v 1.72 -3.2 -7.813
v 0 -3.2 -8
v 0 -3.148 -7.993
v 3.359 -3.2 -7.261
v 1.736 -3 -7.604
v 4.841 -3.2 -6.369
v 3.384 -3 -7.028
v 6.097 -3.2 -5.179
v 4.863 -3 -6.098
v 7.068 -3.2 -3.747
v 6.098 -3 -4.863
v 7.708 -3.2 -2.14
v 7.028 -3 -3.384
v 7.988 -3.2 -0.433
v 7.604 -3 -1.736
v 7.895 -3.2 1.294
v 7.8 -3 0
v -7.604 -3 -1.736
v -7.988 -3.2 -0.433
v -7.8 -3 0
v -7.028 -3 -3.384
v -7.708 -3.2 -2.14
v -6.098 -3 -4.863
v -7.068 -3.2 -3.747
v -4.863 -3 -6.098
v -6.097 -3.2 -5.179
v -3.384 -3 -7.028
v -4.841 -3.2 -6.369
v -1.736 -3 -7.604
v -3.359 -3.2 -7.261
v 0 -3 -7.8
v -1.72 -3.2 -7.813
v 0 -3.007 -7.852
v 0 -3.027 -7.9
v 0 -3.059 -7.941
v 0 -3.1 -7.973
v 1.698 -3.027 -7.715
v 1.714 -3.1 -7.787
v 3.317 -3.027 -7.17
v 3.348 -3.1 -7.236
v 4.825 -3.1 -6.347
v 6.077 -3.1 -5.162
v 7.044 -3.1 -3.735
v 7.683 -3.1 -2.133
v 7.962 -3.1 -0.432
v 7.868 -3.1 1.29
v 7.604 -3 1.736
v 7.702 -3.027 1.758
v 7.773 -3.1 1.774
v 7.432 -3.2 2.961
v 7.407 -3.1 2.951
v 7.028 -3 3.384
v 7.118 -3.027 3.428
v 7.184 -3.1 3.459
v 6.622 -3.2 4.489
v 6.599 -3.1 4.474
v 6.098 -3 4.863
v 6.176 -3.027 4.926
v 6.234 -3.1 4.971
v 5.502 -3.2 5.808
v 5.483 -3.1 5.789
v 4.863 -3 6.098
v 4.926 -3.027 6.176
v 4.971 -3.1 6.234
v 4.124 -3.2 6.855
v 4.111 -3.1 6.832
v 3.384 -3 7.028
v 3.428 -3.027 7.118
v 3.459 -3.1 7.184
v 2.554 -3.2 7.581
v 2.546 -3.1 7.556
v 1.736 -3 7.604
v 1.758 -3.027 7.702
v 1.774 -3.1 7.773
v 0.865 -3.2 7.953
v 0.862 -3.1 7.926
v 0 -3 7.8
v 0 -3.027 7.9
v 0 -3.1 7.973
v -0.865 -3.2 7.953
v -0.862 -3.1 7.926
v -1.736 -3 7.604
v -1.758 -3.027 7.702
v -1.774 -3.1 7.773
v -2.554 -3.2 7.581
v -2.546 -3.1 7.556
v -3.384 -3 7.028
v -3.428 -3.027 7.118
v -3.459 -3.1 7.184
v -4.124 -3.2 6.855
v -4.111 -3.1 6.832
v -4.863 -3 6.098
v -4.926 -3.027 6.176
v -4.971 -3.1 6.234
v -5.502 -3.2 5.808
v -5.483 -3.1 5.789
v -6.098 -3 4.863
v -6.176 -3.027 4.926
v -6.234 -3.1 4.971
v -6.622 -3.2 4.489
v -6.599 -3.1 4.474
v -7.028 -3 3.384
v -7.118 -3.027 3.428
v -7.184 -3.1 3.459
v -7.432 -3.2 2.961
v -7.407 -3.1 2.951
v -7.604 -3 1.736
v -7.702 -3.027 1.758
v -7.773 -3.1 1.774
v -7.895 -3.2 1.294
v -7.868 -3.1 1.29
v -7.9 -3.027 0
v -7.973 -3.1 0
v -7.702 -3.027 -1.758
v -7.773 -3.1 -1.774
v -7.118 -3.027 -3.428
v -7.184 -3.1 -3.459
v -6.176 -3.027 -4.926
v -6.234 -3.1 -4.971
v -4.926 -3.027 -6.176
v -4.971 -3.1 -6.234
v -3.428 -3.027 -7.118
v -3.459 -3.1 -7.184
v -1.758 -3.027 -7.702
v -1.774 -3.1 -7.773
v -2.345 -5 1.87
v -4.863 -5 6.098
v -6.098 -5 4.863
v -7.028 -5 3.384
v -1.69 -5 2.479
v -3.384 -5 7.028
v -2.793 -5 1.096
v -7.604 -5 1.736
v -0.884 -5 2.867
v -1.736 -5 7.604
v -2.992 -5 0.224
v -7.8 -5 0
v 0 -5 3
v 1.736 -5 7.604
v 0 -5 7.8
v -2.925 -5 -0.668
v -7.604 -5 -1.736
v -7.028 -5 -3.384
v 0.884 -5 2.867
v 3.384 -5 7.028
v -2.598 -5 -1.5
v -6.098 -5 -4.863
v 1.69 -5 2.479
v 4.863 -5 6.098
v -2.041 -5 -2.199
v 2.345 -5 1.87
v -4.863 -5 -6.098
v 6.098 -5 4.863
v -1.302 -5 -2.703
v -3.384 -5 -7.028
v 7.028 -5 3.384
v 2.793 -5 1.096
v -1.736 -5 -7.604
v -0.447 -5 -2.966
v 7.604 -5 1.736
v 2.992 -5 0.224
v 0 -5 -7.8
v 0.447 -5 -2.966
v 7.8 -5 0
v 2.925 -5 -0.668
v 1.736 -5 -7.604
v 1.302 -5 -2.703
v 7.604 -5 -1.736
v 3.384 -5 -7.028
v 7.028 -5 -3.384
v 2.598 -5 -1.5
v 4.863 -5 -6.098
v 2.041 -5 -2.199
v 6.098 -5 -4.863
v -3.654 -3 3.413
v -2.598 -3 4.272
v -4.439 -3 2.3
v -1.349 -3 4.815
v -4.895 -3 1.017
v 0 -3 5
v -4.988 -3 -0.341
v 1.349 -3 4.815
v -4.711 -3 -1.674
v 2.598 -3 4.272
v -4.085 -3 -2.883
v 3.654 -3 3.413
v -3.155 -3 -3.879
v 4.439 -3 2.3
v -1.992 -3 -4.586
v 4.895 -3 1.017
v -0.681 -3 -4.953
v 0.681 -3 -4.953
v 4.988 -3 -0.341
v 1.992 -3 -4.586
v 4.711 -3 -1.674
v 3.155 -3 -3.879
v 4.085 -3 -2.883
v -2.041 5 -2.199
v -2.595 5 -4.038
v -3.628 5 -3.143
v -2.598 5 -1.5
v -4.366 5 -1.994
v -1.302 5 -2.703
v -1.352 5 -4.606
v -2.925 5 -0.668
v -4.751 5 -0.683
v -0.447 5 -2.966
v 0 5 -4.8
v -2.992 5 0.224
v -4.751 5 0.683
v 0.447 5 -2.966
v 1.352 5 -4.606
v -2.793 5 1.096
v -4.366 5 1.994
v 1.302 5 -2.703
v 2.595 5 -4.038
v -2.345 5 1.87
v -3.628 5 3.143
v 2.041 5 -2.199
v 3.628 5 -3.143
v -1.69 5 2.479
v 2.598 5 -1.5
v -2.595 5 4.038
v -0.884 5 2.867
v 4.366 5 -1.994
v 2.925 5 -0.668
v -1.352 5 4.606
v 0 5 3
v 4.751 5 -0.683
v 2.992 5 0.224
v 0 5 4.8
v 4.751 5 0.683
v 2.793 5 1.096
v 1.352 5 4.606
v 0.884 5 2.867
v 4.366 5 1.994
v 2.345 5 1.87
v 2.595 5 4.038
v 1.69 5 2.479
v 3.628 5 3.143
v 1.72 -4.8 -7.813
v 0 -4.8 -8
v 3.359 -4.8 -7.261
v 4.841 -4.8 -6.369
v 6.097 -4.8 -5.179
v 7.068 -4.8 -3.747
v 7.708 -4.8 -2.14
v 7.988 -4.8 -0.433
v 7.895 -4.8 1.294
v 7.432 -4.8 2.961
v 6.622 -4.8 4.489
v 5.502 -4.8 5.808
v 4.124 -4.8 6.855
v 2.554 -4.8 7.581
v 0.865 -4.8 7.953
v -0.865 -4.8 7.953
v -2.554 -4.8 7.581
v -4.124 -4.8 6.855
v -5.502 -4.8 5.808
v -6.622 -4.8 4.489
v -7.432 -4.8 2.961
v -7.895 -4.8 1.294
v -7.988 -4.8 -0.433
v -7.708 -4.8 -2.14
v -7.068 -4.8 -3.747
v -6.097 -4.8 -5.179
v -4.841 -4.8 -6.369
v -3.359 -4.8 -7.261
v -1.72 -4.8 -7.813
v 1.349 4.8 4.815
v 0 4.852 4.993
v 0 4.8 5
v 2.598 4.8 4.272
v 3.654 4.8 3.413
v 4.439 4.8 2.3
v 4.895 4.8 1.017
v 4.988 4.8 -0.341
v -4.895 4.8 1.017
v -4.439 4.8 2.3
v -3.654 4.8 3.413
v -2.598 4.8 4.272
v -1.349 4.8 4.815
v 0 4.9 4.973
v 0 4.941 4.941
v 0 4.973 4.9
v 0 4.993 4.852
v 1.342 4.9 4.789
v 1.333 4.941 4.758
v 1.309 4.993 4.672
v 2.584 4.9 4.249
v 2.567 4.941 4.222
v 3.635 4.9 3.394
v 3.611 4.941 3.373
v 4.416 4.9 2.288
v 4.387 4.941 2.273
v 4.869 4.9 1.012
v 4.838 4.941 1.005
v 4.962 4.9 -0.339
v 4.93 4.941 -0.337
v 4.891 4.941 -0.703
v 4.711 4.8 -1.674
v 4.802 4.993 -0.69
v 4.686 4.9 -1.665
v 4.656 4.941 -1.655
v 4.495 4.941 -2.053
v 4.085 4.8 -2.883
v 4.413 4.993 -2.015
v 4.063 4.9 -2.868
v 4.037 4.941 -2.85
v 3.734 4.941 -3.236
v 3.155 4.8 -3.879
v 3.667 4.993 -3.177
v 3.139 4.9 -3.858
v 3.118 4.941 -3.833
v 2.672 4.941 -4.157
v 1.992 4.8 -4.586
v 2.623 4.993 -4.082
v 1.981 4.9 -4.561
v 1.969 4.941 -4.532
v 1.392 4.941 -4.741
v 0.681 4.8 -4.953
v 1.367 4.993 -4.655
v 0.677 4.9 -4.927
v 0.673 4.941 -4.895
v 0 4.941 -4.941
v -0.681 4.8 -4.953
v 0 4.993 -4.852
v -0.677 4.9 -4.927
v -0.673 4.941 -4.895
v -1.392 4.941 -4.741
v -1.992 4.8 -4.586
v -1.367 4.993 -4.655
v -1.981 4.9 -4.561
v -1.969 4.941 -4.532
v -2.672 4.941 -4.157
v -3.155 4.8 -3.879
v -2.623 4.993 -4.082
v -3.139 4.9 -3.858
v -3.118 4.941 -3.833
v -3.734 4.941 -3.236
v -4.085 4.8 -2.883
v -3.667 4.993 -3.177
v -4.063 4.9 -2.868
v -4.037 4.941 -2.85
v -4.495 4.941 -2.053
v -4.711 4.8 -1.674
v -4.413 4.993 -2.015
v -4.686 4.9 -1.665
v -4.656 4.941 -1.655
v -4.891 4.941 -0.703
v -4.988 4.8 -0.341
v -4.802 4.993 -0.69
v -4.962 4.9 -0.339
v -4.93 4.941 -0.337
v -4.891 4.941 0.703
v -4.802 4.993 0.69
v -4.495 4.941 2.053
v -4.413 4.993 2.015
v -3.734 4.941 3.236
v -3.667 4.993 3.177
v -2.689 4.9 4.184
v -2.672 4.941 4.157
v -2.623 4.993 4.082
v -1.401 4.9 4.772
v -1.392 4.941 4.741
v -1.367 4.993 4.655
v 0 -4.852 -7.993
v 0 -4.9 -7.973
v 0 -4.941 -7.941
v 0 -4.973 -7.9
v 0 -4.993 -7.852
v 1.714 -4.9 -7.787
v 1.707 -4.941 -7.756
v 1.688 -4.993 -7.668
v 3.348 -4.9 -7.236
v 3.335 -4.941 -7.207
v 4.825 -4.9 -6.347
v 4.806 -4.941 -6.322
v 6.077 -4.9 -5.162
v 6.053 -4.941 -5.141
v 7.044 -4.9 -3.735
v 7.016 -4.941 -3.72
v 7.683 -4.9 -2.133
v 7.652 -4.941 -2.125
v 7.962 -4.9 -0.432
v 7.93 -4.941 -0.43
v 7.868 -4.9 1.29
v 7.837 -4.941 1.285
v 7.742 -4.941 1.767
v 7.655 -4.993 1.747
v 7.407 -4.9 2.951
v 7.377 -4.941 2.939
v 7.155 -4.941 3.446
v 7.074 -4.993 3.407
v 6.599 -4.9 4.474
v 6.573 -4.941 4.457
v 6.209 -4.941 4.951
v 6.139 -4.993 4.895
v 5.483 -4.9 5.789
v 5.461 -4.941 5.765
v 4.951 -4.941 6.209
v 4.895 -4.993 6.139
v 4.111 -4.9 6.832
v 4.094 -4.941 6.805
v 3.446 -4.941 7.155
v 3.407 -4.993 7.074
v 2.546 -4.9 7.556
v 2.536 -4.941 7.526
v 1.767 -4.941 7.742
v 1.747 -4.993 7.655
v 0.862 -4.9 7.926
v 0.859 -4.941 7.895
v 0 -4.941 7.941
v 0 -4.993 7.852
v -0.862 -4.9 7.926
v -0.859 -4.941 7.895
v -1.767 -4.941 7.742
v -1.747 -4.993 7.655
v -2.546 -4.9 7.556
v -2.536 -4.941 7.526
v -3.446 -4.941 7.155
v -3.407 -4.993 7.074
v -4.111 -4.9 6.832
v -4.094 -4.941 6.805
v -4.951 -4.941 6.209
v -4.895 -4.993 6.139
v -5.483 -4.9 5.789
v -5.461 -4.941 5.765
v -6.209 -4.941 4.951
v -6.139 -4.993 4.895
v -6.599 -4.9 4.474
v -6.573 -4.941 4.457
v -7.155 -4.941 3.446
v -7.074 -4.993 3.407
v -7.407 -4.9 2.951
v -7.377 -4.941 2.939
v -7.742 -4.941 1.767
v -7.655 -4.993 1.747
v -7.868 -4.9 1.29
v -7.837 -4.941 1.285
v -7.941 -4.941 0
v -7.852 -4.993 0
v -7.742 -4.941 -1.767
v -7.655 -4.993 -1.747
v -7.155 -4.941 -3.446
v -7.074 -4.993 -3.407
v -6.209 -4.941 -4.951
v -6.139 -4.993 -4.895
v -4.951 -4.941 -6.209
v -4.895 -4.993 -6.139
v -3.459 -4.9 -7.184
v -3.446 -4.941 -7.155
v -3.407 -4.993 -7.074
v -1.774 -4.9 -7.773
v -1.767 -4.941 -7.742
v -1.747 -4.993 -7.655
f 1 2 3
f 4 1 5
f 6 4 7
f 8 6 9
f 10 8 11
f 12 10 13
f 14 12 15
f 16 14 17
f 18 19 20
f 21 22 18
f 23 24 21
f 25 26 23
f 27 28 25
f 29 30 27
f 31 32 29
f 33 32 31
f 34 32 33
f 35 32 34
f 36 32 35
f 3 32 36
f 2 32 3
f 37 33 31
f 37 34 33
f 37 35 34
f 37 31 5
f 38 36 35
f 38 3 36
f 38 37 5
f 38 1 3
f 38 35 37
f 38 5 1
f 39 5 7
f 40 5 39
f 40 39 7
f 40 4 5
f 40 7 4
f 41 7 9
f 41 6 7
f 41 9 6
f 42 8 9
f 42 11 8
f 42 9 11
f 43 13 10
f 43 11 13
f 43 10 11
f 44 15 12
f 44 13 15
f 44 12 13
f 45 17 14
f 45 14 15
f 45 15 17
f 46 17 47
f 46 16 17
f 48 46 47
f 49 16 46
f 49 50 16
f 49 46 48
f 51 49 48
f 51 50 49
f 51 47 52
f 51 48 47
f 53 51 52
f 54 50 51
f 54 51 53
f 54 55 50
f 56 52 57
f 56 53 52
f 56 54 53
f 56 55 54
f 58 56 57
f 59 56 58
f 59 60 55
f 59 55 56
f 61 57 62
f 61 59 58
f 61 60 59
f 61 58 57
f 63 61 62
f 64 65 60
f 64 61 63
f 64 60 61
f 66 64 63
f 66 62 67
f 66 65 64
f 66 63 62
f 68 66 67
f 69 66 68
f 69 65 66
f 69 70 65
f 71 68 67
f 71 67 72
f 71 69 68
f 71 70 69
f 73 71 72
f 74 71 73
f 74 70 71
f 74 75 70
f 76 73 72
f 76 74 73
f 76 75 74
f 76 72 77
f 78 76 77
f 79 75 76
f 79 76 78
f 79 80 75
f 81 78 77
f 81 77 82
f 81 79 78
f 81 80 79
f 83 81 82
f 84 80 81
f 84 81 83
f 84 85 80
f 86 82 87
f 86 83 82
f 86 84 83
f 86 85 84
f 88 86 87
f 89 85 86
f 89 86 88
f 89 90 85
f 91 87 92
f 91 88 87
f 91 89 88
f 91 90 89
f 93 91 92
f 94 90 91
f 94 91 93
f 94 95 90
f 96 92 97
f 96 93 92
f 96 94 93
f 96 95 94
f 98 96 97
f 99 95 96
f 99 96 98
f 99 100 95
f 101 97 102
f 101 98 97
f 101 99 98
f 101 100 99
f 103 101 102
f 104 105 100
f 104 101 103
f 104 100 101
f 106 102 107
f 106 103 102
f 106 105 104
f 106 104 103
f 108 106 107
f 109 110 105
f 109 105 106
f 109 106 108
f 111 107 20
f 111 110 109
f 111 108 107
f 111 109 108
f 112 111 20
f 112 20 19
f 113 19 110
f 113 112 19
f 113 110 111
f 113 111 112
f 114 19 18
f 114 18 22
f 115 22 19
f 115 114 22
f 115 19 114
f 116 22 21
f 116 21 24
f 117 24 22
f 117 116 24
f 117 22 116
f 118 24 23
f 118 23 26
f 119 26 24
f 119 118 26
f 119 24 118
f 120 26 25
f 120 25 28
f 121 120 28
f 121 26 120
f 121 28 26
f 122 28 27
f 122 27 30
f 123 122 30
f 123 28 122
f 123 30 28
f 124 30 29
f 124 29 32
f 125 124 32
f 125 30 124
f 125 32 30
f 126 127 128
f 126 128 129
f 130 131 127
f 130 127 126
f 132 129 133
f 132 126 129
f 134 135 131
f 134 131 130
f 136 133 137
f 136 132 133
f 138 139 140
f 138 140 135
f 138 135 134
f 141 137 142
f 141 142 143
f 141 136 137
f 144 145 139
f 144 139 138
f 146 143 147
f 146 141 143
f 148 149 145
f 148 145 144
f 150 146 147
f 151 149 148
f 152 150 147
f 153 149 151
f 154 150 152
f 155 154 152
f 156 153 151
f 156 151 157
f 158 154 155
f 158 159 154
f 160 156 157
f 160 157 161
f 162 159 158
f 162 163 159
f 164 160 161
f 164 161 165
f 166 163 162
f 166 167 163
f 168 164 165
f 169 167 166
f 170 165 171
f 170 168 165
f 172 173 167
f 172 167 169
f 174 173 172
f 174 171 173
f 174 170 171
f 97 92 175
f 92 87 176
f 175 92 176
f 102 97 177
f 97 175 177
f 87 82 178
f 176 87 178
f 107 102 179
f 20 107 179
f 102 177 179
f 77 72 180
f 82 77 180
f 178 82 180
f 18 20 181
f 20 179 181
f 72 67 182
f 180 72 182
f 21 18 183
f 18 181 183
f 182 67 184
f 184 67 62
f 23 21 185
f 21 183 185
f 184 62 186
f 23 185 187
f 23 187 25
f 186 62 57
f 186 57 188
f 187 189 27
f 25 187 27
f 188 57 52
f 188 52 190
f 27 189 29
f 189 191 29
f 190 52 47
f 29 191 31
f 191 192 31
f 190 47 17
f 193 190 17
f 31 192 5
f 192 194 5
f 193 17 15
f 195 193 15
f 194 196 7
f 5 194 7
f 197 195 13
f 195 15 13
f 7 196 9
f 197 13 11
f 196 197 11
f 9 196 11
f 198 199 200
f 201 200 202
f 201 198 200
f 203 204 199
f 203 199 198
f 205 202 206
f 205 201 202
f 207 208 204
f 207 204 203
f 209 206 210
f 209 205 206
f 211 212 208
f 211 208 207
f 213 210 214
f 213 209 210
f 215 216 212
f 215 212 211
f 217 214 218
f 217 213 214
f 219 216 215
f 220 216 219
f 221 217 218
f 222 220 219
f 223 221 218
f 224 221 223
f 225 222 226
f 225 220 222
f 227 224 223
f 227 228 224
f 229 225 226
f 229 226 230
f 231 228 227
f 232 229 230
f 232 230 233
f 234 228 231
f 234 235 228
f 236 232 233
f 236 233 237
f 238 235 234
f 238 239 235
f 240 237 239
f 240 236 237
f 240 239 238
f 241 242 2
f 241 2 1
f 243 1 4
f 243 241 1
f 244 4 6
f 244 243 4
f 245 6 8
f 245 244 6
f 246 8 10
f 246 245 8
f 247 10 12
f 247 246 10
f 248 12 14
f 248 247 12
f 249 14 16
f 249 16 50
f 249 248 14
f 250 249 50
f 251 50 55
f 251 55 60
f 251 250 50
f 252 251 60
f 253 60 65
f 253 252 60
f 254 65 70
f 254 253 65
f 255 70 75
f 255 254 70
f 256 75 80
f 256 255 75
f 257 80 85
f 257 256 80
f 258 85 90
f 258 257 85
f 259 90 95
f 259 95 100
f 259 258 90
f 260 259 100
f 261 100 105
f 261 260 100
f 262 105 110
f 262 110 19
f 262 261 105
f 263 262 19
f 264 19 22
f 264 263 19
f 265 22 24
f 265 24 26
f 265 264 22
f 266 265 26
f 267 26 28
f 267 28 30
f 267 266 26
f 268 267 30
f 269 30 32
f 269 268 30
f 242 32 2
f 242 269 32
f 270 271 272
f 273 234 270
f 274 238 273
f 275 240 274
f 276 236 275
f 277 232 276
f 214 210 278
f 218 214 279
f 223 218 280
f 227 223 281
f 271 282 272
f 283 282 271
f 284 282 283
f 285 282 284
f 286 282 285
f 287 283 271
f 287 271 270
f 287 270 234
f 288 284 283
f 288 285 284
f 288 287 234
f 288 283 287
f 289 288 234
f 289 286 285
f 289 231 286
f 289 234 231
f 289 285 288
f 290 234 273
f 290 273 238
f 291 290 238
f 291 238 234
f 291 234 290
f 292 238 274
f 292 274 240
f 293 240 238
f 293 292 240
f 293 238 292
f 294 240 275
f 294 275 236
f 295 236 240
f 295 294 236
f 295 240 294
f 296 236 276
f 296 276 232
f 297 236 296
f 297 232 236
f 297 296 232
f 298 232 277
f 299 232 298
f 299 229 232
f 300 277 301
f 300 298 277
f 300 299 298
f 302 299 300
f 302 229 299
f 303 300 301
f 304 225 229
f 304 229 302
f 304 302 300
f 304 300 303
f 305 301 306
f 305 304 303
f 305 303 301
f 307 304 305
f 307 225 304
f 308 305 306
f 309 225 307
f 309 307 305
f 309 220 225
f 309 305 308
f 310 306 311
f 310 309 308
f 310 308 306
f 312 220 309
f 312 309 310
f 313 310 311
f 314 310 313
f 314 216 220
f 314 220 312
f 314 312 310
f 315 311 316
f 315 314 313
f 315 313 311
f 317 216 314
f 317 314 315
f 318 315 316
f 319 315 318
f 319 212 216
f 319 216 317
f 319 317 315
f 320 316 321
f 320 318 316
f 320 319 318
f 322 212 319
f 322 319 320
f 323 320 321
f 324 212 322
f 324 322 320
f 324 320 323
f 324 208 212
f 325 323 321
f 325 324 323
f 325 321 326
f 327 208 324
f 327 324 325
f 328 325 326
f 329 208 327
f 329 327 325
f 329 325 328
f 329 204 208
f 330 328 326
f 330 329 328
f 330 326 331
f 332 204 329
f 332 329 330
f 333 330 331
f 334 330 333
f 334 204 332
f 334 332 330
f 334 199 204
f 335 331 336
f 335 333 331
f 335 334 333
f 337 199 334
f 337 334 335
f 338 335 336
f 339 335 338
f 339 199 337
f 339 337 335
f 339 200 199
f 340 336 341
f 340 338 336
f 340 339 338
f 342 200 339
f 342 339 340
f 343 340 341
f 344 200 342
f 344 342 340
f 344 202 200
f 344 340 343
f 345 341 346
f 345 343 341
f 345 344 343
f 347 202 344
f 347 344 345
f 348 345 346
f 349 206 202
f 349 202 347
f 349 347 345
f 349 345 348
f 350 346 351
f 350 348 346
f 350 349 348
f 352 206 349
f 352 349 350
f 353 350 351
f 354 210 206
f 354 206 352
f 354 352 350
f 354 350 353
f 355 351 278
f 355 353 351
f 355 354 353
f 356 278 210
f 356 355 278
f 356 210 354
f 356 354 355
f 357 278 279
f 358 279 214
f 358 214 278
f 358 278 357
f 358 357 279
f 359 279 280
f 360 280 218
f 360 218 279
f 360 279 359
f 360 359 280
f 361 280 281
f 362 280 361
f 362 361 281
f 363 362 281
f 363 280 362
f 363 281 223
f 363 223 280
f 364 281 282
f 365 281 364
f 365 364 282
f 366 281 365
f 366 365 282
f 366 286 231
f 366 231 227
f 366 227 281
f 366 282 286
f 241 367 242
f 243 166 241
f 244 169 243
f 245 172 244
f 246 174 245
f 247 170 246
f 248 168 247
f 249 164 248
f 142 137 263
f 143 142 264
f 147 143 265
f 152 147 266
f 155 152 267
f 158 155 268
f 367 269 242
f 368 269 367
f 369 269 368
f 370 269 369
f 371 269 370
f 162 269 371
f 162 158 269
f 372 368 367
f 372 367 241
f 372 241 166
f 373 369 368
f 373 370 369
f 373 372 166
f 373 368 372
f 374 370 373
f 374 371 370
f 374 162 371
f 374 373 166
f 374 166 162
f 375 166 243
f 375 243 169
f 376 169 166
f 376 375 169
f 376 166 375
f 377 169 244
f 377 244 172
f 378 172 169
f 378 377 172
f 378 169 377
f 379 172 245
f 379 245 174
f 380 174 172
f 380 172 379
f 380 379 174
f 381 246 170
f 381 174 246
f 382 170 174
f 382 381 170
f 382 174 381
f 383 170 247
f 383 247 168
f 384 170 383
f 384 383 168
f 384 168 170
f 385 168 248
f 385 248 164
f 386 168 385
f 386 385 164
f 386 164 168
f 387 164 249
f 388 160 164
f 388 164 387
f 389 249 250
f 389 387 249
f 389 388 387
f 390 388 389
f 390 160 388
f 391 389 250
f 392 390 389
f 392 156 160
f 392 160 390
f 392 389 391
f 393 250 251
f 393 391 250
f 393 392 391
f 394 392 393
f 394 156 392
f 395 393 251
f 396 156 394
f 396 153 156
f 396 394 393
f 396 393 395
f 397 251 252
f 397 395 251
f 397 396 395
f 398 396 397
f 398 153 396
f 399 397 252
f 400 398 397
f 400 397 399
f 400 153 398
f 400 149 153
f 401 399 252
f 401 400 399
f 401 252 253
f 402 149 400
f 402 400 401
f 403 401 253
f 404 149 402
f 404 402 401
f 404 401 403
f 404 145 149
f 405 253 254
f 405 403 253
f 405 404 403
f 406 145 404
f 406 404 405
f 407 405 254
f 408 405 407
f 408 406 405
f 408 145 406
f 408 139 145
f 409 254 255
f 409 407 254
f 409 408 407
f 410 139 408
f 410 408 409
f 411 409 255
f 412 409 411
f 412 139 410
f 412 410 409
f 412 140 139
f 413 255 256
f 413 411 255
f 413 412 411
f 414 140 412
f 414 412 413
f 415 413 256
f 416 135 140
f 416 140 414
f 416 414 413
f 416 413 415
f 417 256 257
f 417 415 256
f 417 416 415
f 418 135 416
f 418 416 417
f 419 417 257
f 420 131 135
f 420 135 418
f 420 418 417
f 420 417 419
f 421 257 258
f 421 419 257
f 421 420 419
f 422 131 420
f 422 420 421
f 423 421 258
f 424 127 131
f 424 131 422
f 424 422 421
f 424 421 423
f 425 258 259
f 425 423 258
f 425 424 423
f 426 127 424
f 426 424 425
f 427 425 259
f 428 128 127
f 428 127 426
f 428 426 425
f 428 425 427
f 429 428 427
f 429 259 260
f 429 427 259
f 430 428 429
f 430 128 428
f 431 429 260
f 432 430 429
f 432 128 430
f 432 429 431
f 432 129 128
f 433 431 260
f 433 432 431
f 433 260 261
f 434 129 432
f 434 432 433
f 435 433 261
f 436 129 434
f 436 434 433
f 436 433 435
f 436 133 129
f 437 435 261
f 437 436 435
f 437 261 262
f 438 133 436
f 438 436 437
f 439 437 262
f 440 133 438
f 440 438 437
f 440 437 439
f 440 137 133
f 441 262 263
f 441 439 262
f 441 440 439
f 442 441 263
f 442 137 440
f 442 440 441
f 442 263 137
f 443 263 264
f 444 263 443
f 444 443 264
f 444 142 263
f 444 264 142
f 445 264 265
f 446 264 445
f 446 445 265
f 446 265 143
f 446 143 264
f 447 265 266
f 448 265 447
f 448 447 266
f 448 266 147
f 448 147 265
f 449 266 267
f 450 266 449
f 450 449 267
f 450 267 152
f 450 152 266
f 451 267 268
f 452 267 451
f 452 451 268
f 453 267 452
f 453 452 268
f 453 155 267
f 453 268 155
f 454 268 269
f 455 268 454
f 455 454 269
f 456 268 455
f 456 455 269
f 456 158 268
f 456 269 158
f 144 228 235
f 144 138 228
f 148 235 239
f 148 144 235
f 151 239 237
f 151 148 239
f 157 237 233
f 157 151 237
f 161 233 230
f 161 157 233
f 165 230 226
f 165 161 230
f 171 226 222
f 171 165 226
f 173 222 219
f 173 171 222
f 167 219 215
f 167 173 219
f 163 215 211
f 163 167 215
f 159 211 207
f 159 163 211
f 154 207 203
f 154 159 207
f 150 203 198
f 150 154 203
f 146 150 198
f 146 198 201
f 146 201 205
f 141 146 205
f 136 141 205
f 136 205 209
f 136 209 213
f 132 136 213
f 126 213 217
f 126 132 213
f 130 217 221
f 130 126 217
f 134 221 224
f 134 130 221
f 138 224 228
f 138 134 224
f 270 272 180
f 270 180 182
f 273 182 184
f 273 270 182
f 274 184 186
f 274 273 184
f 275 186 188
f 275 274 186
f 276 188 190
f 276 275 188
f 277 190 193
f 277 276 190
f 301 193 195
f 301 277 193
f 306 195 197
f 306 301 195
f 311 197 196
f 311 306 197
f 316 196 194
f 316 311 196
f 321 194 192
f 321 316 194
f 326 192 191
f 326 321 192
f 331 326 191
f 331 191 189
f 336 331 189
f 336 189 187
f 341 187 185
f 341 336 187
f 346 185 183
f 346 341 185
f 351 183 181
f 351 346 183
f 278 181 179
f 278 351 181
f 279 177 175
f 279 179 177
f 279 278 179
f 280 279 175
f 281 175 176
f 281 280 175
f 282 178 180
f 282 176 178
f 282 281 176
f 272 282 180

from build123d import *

# Parameters (mm, degrees)
SKETCH_1_R      = 5
SKETCH_1_R_2    = 3
EXTRUDE_1_DEPTH = 5
SKETCH_2_R      = 8
SKETCH_2_R_2    = 5
EXTRUDE_2_DEPTH = 2
FILLET_1_R      = 0.2


with BuildPart() as part:
    # 草图1 → 凸台-拉伸1 (new, symmetric)
    with BuildSketch(Plane(origin=(0, 0, 0), x_dir=(1, 0, 0), z_dir=(0, 1, 0))):
        with Locations(Location((0, 0, 0), (0, 0, 270))):
            Circle(SKETCH_1_R)
        with Locations(Location((0, 0, 0), (0, 0, 270))):
            Circle(SKETCH_1_R_2, mode=Mode.SUBTRACT)
    extrude(amount=EXTRUDE_1_DEPTH, both=True)


with BuildPart() as body_2:
    # 草图2 → 凸台-拉伸2 (new body)
    with BuildSketch(Plane.XZ.offset(5)):
        with Locations(Location((0, 0, 0), (0, 0, 270))):
            Circle(SKETCH_2_R)
        with Locations(Location((0, 0, 0), (0, 0, 90))):
            Circle(SKETCH_2_R_2, mode=Mode.SUBTRACT)
    extrude(amount=-EXTRUDE_2_DEPTH)

    # Combine 1: union part
    add(part.part)

    # 圆角1
    fillet_1_edges = [body_2.edges().sort_by_distance(p)[0] for p in [
        (0, 5, -5),
        (0, -5, 8),
        (0, -3, 8),
    ]]
    fillet(fillet_1_edges, radius=FILLET_1_R)


solid = body_2.part
